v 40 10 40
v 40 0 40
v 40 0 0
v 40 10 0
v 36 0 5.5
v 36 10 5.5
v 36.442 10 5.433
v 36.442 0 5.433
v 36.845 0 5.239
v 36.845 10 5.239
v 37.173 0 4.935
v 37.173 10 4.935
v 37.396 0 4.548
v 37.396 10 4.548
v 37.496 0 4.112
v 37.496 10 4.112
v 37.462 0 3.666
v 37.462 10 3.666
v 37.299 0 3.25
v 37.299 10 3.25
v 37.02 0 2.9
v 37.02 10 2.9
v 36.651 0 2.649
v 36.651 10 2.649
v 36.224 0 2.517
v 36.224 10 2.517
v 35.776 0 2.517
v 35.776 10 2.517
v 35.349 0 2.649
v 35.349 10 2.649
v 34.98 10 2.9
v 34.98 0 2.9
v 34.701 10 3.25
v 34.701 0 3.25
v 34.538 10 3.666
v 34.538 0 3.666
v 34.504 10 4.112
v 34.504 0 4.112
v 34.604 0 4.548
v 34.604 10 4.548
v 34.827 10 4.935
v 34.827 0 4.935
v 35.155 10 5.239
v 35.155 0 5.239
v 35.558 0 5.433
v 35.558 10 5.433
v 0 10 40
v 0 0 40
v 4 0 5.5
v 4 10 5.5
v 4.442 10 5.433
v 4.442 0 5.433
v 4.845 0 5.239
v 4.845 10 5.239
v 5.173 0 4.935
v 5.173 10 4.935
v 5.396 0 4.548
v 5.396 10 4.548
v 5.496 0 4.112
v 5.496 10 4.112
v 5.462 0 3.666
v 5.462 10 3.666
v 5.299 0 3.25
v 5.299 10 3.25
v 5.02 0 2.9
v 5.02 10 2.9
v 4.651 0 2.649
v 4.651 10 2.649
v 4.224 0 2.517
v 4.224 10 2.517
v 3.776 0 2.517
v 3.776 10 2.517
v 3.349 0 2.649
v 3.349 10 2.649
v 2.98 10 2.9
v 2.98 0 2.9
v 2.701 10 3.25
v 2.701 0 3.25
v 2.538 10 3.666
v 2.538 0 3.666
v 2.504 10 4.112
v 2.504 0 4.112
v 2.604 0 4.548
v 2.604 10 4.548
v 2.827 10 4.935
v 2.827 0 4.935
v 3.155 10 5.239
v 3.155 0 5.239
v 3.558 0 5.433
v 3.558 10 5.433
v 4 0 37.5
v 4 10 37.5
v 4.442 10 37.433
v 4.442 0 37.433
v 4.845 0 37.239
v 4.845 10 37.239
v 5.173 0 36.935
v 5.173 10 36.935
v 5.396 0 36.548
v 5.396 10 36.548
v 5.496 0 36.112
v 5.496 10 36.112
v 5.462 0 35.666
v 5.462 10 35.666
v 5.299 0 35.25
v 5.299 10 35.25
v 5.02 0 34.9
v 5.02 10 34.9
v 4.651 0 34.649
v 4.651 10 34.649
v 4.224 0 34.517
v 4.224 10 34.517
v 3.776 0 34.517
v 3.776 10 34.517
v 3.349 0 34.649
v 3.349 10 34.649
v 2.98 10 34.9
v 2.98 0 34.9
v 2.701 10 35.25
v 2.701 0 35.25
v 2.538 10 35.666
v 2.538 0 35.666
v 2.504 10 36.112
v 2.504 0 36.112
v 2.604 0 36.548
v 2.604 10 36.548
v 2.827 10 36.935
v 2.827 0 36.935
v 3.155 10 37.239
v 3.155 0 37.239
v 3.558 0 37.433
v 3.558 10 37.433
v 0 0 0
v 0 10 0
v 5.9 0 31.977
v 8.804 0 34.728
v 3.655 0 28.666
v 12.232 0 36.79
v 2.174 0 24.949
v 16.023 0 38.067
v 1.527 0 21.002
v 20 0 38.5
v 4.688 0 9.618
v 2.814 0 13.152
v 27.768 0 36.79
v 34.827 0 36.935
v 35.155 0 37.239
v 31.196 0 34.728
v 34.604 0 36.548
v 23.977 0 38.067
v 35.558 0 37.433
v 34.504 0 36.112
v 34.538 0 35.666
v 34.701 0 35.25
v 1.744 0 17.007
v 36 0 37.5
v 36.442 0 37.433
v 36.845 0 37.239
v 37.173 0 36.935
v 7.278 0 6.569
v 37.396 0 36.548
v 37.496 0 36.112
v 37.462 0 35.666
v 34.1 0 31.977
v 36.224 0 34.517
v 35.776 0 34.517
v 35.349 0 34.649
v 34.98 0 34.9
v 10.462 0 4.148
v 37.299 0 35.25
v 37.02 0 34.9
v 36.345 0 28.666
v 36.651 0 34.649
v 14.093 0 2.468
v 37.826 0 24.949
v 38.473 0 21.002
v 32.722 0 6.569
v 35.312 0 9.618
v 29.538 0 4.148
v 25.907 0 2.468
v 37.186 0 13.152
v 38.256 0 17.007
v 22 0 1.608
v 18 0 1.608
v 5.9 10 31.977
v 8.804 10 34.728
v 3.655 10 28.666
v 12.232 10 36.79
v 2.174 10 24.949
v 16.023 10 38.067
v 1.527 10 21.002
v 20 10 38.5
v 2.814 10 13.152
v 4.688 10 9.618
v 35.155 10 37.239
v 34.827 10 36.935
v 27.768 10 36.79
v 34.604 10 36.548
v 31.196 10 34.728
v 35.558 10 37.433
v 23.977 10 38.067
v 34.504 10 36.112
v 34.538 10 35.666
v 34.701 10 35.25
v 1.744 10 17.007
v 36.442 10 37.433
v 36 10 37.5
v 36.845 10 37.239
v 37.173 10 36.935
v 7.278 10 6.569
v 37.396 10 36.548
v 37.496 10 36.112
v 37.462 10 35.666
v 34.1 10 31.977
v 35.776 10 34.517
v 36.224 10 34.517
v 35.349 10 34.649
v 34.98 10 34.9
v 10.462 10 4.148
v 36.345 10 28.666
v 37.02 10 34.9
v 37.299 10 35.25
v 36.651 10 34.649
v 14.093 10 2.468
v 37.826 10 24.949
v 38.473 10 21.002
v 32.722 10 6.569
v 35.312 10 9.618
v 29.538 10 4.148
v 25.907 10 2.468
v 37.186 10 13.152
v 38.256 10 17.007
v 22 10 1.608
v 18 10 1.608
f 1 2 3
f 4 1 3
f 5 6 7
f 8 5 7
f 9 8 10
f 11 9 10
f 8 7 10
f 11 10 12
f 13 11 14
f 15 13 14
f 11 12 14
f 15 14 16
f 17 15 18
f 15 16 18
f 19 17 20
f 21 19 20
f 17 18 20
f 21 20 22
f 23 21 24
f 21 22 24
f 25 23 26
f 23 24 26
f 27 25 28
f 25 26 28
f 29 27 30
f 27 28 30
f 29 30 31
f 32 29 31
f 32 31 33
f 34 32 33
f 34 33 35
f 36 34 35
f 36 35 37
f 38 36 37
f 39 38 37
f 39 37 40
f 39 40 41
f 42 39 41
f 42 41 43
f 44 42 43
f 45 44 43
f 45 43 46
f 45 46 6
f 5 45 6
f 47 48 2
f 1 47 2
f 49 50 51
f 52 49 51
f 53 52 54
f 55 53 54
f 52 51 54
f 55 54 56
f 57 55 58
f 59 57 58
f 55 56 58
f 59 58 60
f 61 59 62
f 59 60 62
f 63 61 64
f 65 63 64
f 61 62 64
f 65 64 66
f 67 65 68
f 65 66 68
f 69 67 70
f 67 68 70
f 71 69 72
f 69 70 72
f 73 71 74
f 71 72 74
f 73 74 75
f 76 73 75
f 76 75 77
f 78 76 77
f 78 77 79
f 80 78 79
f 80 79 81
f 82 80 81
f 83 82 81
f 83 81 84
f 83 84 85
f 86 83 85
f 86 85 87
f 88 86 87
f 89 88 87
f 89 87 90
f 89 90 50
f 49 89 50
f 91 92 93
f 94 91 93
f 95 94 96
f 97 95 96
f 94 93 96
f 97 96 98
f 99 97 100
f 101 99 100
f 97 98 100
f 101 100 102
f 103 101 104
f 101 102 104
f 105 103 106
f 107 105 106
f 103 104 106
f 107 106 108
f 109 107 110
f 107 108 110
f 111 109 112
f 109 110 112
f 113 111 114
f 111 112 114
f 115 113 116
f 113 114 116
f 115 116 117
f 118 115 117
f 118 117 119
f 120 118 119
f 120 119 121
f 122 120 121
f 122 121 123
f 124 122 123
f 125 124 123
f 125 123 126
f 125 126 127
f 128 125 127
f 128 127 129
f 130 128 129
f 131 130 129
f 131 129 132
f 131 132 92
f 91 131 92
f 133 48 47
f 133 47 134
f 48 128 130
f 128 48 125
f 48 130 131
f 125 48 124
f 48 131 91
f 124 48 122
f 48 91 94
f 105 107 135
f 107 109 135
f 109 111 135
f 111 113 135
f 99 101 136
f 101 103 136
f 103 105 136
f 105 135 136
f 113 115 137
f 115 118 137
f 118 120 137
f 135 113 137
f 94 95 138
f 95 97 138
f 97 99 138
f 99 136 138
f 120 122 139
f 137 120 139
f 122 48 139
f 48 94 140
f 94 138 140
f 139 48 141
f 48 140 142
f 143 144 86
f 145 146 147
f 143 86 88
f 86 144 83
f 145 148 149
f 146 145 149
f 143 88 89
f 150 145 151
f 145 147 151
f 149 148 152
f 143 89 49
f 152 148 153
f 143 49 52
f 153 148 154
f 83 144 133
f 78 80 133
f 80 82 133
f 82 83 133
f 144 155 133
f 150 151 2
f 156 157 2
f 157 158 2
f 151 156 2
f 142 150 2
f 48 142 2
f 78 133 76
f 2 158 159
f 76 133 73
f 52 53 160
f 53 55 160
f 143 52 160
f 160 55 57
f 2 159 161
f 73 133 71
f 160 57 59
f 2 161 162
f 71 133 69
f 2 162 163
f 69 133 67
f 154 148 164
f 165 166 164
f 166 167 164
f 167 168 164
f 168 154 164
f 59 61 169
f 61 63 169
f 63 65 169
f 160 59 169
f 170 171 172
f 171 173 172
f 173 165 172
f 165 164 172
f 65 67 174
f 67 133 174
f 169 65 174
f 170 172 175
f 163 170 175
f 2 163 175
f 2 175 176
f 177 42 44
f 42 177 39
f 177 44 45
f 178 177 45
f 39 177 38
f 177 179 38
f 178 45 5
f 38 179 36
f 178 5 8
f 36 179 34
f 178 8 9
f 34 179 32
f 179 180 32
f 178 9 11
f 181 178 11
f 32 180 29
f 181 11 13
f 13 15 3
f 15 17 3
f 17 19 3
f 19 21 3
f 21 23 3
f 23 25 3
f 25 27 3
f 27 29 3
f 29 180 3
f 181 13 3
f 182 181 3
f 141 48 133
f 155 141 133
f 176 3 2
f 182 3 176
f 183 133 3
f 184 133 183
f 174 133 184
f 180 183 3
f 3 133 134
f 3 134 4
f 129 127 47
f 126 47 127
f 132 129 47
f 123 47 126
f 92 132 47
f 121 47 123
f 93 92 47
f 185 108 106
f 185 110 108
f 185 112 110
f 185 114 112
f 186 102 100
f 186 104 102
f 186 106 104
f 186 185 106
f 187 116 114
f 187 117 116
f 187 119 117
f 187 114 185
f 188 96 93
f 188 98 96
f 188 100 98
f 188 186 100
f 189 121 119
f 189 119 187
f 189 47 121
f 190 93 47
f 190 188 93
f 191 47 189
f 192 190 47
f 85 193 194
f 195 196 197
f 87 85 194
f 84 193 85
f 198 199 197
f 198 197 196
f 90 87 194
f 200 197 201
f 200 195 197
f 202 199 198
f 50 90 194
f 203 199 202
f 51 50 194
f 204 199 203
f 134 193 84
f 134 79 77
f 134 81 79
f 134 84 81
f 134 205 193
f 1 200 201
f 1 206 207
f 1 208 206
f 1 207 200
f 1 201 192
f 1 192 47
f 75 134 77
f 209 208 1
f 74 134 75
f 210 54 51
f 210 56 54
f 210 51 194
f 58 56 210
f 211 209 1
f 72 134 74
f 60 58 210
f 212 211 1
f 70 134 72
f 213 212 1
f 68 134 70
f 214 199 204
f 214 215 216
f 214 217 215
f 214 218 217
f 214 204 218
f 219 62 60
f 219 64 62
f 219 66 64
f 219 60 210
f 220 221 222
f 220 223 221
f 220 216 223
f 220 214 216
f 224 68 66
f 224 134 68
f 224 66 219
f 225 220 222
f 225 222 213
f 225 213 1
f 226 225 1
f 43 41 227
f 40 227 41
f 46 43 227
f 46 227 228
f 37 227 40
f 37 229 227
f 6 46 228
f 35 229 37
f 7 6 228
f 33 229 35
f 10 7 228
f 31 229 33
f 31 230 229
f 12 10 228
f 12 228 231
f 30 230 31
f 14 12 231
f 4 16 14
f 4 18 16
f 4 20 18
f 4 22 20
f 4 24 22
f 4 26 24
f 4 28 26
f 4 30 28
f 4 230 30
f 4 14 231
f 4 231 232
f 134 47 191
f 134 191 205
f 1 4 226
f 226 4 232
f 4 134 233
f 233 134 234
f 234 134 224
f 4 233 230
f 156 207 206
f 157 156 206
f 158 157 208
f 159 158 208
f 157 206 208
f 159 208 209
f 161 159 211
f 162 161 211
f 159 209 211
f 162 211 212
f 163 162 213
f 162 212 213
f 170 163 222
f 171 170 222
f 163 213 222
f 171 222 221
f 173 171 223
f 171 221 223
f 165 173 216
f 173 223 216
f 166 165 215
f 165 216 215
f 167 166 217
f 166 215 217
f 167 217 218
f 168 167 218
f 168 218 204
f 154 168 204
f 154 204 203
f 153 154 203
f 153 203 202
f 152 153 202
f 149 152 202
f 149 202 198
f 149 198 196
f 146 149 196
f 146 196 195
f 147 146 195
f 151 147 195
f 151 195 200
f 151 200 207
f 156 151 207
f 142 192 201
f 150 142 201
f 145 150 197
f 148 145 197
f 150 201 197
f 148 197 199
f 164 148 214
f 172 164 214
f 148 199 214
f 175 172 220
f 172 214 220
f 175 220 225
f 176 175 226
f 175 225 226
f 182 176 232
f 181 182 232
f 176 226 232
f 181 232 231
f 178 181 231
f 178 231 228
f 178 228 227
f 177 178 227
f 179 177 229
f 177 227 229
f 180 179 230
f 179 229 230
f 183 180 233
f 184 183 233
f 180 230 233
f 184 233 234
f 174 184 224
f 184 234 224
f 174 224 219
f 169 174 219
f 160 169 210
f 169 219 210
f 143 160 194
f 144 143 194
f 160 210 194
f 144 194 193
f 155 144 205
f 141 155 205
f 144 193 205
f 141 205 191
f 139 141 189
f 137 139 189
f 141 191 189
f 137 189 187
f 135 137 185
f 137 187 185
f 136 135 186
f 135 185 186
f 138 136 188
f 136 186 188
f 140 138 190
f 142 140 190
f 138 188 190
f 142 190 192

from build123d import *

# Parameters (mm, degrees)
SKETCH1_W           = 40
SKETCH1_H           = 40
BOSS_EXTRUDE1_DEPTH = 10
SKETCH2_R           = 1.5
CUT_EXTRUDE1_DEPTH  = 58.445626465
SKETCH3_R           = 18.5
CUT_EXTRUDE2_DEPTH  = 10


with BuildPart() as part:
    # Sketch1 → Boss-Extrude1 (new body)
    with BuildSketch(Plane(origin=(0, 0, 0), x_dir=(1, 0, 0), z_dir=(0, 1, 0))):
        with Locations((20, -20)):
            Rectangle(SKETCH1_W, SKETCH1_H)
    extrude(amount=BOSS_EXTRUDE1_DEPTH)

    # Sketch2 → Cut-Extrude1 (cut, through all)
    with BuildSketch(Plane(origin=(0, 10, 0), x_dir=(1, 0, 0), z_dir=(0, 1, 0))):
        with Locations(Location((4, -36, 0), (0, 0, 270))):
            Circle(SKETCH2_R)
        with Locations(Location((36, -36, 0), (0, 0, 270))):
            Circle(SKETCH2_R)
        with Locations(Location((36, -4, 0), (0, 0, 270))):
            Circle(SKETCH2_R)
        with Locations(Location((4, -4, 0), (0, 0, 270))):
            Circle(SKETCH2_R)
    extrude(amount=-CUT_EXTRUDE1_DEPTH, mode=Mode.SUBTRACT)

    # Sketch3 → Cut-Extrude2 (cut)
    with BuildSketch(Plane(origin=(0, 10, 0), x_dir=(1, 0, 0), z_dir=(0, 1, 0))):
        with Locations(Location((20, -20, 0), (0, 0, 270))):
            Circle(SKETCH3_R)
    extrude(amount=-CUT_EXTRUDE2_DEPTH, mode=Mode.SUBTRACT)


solid = part.part
